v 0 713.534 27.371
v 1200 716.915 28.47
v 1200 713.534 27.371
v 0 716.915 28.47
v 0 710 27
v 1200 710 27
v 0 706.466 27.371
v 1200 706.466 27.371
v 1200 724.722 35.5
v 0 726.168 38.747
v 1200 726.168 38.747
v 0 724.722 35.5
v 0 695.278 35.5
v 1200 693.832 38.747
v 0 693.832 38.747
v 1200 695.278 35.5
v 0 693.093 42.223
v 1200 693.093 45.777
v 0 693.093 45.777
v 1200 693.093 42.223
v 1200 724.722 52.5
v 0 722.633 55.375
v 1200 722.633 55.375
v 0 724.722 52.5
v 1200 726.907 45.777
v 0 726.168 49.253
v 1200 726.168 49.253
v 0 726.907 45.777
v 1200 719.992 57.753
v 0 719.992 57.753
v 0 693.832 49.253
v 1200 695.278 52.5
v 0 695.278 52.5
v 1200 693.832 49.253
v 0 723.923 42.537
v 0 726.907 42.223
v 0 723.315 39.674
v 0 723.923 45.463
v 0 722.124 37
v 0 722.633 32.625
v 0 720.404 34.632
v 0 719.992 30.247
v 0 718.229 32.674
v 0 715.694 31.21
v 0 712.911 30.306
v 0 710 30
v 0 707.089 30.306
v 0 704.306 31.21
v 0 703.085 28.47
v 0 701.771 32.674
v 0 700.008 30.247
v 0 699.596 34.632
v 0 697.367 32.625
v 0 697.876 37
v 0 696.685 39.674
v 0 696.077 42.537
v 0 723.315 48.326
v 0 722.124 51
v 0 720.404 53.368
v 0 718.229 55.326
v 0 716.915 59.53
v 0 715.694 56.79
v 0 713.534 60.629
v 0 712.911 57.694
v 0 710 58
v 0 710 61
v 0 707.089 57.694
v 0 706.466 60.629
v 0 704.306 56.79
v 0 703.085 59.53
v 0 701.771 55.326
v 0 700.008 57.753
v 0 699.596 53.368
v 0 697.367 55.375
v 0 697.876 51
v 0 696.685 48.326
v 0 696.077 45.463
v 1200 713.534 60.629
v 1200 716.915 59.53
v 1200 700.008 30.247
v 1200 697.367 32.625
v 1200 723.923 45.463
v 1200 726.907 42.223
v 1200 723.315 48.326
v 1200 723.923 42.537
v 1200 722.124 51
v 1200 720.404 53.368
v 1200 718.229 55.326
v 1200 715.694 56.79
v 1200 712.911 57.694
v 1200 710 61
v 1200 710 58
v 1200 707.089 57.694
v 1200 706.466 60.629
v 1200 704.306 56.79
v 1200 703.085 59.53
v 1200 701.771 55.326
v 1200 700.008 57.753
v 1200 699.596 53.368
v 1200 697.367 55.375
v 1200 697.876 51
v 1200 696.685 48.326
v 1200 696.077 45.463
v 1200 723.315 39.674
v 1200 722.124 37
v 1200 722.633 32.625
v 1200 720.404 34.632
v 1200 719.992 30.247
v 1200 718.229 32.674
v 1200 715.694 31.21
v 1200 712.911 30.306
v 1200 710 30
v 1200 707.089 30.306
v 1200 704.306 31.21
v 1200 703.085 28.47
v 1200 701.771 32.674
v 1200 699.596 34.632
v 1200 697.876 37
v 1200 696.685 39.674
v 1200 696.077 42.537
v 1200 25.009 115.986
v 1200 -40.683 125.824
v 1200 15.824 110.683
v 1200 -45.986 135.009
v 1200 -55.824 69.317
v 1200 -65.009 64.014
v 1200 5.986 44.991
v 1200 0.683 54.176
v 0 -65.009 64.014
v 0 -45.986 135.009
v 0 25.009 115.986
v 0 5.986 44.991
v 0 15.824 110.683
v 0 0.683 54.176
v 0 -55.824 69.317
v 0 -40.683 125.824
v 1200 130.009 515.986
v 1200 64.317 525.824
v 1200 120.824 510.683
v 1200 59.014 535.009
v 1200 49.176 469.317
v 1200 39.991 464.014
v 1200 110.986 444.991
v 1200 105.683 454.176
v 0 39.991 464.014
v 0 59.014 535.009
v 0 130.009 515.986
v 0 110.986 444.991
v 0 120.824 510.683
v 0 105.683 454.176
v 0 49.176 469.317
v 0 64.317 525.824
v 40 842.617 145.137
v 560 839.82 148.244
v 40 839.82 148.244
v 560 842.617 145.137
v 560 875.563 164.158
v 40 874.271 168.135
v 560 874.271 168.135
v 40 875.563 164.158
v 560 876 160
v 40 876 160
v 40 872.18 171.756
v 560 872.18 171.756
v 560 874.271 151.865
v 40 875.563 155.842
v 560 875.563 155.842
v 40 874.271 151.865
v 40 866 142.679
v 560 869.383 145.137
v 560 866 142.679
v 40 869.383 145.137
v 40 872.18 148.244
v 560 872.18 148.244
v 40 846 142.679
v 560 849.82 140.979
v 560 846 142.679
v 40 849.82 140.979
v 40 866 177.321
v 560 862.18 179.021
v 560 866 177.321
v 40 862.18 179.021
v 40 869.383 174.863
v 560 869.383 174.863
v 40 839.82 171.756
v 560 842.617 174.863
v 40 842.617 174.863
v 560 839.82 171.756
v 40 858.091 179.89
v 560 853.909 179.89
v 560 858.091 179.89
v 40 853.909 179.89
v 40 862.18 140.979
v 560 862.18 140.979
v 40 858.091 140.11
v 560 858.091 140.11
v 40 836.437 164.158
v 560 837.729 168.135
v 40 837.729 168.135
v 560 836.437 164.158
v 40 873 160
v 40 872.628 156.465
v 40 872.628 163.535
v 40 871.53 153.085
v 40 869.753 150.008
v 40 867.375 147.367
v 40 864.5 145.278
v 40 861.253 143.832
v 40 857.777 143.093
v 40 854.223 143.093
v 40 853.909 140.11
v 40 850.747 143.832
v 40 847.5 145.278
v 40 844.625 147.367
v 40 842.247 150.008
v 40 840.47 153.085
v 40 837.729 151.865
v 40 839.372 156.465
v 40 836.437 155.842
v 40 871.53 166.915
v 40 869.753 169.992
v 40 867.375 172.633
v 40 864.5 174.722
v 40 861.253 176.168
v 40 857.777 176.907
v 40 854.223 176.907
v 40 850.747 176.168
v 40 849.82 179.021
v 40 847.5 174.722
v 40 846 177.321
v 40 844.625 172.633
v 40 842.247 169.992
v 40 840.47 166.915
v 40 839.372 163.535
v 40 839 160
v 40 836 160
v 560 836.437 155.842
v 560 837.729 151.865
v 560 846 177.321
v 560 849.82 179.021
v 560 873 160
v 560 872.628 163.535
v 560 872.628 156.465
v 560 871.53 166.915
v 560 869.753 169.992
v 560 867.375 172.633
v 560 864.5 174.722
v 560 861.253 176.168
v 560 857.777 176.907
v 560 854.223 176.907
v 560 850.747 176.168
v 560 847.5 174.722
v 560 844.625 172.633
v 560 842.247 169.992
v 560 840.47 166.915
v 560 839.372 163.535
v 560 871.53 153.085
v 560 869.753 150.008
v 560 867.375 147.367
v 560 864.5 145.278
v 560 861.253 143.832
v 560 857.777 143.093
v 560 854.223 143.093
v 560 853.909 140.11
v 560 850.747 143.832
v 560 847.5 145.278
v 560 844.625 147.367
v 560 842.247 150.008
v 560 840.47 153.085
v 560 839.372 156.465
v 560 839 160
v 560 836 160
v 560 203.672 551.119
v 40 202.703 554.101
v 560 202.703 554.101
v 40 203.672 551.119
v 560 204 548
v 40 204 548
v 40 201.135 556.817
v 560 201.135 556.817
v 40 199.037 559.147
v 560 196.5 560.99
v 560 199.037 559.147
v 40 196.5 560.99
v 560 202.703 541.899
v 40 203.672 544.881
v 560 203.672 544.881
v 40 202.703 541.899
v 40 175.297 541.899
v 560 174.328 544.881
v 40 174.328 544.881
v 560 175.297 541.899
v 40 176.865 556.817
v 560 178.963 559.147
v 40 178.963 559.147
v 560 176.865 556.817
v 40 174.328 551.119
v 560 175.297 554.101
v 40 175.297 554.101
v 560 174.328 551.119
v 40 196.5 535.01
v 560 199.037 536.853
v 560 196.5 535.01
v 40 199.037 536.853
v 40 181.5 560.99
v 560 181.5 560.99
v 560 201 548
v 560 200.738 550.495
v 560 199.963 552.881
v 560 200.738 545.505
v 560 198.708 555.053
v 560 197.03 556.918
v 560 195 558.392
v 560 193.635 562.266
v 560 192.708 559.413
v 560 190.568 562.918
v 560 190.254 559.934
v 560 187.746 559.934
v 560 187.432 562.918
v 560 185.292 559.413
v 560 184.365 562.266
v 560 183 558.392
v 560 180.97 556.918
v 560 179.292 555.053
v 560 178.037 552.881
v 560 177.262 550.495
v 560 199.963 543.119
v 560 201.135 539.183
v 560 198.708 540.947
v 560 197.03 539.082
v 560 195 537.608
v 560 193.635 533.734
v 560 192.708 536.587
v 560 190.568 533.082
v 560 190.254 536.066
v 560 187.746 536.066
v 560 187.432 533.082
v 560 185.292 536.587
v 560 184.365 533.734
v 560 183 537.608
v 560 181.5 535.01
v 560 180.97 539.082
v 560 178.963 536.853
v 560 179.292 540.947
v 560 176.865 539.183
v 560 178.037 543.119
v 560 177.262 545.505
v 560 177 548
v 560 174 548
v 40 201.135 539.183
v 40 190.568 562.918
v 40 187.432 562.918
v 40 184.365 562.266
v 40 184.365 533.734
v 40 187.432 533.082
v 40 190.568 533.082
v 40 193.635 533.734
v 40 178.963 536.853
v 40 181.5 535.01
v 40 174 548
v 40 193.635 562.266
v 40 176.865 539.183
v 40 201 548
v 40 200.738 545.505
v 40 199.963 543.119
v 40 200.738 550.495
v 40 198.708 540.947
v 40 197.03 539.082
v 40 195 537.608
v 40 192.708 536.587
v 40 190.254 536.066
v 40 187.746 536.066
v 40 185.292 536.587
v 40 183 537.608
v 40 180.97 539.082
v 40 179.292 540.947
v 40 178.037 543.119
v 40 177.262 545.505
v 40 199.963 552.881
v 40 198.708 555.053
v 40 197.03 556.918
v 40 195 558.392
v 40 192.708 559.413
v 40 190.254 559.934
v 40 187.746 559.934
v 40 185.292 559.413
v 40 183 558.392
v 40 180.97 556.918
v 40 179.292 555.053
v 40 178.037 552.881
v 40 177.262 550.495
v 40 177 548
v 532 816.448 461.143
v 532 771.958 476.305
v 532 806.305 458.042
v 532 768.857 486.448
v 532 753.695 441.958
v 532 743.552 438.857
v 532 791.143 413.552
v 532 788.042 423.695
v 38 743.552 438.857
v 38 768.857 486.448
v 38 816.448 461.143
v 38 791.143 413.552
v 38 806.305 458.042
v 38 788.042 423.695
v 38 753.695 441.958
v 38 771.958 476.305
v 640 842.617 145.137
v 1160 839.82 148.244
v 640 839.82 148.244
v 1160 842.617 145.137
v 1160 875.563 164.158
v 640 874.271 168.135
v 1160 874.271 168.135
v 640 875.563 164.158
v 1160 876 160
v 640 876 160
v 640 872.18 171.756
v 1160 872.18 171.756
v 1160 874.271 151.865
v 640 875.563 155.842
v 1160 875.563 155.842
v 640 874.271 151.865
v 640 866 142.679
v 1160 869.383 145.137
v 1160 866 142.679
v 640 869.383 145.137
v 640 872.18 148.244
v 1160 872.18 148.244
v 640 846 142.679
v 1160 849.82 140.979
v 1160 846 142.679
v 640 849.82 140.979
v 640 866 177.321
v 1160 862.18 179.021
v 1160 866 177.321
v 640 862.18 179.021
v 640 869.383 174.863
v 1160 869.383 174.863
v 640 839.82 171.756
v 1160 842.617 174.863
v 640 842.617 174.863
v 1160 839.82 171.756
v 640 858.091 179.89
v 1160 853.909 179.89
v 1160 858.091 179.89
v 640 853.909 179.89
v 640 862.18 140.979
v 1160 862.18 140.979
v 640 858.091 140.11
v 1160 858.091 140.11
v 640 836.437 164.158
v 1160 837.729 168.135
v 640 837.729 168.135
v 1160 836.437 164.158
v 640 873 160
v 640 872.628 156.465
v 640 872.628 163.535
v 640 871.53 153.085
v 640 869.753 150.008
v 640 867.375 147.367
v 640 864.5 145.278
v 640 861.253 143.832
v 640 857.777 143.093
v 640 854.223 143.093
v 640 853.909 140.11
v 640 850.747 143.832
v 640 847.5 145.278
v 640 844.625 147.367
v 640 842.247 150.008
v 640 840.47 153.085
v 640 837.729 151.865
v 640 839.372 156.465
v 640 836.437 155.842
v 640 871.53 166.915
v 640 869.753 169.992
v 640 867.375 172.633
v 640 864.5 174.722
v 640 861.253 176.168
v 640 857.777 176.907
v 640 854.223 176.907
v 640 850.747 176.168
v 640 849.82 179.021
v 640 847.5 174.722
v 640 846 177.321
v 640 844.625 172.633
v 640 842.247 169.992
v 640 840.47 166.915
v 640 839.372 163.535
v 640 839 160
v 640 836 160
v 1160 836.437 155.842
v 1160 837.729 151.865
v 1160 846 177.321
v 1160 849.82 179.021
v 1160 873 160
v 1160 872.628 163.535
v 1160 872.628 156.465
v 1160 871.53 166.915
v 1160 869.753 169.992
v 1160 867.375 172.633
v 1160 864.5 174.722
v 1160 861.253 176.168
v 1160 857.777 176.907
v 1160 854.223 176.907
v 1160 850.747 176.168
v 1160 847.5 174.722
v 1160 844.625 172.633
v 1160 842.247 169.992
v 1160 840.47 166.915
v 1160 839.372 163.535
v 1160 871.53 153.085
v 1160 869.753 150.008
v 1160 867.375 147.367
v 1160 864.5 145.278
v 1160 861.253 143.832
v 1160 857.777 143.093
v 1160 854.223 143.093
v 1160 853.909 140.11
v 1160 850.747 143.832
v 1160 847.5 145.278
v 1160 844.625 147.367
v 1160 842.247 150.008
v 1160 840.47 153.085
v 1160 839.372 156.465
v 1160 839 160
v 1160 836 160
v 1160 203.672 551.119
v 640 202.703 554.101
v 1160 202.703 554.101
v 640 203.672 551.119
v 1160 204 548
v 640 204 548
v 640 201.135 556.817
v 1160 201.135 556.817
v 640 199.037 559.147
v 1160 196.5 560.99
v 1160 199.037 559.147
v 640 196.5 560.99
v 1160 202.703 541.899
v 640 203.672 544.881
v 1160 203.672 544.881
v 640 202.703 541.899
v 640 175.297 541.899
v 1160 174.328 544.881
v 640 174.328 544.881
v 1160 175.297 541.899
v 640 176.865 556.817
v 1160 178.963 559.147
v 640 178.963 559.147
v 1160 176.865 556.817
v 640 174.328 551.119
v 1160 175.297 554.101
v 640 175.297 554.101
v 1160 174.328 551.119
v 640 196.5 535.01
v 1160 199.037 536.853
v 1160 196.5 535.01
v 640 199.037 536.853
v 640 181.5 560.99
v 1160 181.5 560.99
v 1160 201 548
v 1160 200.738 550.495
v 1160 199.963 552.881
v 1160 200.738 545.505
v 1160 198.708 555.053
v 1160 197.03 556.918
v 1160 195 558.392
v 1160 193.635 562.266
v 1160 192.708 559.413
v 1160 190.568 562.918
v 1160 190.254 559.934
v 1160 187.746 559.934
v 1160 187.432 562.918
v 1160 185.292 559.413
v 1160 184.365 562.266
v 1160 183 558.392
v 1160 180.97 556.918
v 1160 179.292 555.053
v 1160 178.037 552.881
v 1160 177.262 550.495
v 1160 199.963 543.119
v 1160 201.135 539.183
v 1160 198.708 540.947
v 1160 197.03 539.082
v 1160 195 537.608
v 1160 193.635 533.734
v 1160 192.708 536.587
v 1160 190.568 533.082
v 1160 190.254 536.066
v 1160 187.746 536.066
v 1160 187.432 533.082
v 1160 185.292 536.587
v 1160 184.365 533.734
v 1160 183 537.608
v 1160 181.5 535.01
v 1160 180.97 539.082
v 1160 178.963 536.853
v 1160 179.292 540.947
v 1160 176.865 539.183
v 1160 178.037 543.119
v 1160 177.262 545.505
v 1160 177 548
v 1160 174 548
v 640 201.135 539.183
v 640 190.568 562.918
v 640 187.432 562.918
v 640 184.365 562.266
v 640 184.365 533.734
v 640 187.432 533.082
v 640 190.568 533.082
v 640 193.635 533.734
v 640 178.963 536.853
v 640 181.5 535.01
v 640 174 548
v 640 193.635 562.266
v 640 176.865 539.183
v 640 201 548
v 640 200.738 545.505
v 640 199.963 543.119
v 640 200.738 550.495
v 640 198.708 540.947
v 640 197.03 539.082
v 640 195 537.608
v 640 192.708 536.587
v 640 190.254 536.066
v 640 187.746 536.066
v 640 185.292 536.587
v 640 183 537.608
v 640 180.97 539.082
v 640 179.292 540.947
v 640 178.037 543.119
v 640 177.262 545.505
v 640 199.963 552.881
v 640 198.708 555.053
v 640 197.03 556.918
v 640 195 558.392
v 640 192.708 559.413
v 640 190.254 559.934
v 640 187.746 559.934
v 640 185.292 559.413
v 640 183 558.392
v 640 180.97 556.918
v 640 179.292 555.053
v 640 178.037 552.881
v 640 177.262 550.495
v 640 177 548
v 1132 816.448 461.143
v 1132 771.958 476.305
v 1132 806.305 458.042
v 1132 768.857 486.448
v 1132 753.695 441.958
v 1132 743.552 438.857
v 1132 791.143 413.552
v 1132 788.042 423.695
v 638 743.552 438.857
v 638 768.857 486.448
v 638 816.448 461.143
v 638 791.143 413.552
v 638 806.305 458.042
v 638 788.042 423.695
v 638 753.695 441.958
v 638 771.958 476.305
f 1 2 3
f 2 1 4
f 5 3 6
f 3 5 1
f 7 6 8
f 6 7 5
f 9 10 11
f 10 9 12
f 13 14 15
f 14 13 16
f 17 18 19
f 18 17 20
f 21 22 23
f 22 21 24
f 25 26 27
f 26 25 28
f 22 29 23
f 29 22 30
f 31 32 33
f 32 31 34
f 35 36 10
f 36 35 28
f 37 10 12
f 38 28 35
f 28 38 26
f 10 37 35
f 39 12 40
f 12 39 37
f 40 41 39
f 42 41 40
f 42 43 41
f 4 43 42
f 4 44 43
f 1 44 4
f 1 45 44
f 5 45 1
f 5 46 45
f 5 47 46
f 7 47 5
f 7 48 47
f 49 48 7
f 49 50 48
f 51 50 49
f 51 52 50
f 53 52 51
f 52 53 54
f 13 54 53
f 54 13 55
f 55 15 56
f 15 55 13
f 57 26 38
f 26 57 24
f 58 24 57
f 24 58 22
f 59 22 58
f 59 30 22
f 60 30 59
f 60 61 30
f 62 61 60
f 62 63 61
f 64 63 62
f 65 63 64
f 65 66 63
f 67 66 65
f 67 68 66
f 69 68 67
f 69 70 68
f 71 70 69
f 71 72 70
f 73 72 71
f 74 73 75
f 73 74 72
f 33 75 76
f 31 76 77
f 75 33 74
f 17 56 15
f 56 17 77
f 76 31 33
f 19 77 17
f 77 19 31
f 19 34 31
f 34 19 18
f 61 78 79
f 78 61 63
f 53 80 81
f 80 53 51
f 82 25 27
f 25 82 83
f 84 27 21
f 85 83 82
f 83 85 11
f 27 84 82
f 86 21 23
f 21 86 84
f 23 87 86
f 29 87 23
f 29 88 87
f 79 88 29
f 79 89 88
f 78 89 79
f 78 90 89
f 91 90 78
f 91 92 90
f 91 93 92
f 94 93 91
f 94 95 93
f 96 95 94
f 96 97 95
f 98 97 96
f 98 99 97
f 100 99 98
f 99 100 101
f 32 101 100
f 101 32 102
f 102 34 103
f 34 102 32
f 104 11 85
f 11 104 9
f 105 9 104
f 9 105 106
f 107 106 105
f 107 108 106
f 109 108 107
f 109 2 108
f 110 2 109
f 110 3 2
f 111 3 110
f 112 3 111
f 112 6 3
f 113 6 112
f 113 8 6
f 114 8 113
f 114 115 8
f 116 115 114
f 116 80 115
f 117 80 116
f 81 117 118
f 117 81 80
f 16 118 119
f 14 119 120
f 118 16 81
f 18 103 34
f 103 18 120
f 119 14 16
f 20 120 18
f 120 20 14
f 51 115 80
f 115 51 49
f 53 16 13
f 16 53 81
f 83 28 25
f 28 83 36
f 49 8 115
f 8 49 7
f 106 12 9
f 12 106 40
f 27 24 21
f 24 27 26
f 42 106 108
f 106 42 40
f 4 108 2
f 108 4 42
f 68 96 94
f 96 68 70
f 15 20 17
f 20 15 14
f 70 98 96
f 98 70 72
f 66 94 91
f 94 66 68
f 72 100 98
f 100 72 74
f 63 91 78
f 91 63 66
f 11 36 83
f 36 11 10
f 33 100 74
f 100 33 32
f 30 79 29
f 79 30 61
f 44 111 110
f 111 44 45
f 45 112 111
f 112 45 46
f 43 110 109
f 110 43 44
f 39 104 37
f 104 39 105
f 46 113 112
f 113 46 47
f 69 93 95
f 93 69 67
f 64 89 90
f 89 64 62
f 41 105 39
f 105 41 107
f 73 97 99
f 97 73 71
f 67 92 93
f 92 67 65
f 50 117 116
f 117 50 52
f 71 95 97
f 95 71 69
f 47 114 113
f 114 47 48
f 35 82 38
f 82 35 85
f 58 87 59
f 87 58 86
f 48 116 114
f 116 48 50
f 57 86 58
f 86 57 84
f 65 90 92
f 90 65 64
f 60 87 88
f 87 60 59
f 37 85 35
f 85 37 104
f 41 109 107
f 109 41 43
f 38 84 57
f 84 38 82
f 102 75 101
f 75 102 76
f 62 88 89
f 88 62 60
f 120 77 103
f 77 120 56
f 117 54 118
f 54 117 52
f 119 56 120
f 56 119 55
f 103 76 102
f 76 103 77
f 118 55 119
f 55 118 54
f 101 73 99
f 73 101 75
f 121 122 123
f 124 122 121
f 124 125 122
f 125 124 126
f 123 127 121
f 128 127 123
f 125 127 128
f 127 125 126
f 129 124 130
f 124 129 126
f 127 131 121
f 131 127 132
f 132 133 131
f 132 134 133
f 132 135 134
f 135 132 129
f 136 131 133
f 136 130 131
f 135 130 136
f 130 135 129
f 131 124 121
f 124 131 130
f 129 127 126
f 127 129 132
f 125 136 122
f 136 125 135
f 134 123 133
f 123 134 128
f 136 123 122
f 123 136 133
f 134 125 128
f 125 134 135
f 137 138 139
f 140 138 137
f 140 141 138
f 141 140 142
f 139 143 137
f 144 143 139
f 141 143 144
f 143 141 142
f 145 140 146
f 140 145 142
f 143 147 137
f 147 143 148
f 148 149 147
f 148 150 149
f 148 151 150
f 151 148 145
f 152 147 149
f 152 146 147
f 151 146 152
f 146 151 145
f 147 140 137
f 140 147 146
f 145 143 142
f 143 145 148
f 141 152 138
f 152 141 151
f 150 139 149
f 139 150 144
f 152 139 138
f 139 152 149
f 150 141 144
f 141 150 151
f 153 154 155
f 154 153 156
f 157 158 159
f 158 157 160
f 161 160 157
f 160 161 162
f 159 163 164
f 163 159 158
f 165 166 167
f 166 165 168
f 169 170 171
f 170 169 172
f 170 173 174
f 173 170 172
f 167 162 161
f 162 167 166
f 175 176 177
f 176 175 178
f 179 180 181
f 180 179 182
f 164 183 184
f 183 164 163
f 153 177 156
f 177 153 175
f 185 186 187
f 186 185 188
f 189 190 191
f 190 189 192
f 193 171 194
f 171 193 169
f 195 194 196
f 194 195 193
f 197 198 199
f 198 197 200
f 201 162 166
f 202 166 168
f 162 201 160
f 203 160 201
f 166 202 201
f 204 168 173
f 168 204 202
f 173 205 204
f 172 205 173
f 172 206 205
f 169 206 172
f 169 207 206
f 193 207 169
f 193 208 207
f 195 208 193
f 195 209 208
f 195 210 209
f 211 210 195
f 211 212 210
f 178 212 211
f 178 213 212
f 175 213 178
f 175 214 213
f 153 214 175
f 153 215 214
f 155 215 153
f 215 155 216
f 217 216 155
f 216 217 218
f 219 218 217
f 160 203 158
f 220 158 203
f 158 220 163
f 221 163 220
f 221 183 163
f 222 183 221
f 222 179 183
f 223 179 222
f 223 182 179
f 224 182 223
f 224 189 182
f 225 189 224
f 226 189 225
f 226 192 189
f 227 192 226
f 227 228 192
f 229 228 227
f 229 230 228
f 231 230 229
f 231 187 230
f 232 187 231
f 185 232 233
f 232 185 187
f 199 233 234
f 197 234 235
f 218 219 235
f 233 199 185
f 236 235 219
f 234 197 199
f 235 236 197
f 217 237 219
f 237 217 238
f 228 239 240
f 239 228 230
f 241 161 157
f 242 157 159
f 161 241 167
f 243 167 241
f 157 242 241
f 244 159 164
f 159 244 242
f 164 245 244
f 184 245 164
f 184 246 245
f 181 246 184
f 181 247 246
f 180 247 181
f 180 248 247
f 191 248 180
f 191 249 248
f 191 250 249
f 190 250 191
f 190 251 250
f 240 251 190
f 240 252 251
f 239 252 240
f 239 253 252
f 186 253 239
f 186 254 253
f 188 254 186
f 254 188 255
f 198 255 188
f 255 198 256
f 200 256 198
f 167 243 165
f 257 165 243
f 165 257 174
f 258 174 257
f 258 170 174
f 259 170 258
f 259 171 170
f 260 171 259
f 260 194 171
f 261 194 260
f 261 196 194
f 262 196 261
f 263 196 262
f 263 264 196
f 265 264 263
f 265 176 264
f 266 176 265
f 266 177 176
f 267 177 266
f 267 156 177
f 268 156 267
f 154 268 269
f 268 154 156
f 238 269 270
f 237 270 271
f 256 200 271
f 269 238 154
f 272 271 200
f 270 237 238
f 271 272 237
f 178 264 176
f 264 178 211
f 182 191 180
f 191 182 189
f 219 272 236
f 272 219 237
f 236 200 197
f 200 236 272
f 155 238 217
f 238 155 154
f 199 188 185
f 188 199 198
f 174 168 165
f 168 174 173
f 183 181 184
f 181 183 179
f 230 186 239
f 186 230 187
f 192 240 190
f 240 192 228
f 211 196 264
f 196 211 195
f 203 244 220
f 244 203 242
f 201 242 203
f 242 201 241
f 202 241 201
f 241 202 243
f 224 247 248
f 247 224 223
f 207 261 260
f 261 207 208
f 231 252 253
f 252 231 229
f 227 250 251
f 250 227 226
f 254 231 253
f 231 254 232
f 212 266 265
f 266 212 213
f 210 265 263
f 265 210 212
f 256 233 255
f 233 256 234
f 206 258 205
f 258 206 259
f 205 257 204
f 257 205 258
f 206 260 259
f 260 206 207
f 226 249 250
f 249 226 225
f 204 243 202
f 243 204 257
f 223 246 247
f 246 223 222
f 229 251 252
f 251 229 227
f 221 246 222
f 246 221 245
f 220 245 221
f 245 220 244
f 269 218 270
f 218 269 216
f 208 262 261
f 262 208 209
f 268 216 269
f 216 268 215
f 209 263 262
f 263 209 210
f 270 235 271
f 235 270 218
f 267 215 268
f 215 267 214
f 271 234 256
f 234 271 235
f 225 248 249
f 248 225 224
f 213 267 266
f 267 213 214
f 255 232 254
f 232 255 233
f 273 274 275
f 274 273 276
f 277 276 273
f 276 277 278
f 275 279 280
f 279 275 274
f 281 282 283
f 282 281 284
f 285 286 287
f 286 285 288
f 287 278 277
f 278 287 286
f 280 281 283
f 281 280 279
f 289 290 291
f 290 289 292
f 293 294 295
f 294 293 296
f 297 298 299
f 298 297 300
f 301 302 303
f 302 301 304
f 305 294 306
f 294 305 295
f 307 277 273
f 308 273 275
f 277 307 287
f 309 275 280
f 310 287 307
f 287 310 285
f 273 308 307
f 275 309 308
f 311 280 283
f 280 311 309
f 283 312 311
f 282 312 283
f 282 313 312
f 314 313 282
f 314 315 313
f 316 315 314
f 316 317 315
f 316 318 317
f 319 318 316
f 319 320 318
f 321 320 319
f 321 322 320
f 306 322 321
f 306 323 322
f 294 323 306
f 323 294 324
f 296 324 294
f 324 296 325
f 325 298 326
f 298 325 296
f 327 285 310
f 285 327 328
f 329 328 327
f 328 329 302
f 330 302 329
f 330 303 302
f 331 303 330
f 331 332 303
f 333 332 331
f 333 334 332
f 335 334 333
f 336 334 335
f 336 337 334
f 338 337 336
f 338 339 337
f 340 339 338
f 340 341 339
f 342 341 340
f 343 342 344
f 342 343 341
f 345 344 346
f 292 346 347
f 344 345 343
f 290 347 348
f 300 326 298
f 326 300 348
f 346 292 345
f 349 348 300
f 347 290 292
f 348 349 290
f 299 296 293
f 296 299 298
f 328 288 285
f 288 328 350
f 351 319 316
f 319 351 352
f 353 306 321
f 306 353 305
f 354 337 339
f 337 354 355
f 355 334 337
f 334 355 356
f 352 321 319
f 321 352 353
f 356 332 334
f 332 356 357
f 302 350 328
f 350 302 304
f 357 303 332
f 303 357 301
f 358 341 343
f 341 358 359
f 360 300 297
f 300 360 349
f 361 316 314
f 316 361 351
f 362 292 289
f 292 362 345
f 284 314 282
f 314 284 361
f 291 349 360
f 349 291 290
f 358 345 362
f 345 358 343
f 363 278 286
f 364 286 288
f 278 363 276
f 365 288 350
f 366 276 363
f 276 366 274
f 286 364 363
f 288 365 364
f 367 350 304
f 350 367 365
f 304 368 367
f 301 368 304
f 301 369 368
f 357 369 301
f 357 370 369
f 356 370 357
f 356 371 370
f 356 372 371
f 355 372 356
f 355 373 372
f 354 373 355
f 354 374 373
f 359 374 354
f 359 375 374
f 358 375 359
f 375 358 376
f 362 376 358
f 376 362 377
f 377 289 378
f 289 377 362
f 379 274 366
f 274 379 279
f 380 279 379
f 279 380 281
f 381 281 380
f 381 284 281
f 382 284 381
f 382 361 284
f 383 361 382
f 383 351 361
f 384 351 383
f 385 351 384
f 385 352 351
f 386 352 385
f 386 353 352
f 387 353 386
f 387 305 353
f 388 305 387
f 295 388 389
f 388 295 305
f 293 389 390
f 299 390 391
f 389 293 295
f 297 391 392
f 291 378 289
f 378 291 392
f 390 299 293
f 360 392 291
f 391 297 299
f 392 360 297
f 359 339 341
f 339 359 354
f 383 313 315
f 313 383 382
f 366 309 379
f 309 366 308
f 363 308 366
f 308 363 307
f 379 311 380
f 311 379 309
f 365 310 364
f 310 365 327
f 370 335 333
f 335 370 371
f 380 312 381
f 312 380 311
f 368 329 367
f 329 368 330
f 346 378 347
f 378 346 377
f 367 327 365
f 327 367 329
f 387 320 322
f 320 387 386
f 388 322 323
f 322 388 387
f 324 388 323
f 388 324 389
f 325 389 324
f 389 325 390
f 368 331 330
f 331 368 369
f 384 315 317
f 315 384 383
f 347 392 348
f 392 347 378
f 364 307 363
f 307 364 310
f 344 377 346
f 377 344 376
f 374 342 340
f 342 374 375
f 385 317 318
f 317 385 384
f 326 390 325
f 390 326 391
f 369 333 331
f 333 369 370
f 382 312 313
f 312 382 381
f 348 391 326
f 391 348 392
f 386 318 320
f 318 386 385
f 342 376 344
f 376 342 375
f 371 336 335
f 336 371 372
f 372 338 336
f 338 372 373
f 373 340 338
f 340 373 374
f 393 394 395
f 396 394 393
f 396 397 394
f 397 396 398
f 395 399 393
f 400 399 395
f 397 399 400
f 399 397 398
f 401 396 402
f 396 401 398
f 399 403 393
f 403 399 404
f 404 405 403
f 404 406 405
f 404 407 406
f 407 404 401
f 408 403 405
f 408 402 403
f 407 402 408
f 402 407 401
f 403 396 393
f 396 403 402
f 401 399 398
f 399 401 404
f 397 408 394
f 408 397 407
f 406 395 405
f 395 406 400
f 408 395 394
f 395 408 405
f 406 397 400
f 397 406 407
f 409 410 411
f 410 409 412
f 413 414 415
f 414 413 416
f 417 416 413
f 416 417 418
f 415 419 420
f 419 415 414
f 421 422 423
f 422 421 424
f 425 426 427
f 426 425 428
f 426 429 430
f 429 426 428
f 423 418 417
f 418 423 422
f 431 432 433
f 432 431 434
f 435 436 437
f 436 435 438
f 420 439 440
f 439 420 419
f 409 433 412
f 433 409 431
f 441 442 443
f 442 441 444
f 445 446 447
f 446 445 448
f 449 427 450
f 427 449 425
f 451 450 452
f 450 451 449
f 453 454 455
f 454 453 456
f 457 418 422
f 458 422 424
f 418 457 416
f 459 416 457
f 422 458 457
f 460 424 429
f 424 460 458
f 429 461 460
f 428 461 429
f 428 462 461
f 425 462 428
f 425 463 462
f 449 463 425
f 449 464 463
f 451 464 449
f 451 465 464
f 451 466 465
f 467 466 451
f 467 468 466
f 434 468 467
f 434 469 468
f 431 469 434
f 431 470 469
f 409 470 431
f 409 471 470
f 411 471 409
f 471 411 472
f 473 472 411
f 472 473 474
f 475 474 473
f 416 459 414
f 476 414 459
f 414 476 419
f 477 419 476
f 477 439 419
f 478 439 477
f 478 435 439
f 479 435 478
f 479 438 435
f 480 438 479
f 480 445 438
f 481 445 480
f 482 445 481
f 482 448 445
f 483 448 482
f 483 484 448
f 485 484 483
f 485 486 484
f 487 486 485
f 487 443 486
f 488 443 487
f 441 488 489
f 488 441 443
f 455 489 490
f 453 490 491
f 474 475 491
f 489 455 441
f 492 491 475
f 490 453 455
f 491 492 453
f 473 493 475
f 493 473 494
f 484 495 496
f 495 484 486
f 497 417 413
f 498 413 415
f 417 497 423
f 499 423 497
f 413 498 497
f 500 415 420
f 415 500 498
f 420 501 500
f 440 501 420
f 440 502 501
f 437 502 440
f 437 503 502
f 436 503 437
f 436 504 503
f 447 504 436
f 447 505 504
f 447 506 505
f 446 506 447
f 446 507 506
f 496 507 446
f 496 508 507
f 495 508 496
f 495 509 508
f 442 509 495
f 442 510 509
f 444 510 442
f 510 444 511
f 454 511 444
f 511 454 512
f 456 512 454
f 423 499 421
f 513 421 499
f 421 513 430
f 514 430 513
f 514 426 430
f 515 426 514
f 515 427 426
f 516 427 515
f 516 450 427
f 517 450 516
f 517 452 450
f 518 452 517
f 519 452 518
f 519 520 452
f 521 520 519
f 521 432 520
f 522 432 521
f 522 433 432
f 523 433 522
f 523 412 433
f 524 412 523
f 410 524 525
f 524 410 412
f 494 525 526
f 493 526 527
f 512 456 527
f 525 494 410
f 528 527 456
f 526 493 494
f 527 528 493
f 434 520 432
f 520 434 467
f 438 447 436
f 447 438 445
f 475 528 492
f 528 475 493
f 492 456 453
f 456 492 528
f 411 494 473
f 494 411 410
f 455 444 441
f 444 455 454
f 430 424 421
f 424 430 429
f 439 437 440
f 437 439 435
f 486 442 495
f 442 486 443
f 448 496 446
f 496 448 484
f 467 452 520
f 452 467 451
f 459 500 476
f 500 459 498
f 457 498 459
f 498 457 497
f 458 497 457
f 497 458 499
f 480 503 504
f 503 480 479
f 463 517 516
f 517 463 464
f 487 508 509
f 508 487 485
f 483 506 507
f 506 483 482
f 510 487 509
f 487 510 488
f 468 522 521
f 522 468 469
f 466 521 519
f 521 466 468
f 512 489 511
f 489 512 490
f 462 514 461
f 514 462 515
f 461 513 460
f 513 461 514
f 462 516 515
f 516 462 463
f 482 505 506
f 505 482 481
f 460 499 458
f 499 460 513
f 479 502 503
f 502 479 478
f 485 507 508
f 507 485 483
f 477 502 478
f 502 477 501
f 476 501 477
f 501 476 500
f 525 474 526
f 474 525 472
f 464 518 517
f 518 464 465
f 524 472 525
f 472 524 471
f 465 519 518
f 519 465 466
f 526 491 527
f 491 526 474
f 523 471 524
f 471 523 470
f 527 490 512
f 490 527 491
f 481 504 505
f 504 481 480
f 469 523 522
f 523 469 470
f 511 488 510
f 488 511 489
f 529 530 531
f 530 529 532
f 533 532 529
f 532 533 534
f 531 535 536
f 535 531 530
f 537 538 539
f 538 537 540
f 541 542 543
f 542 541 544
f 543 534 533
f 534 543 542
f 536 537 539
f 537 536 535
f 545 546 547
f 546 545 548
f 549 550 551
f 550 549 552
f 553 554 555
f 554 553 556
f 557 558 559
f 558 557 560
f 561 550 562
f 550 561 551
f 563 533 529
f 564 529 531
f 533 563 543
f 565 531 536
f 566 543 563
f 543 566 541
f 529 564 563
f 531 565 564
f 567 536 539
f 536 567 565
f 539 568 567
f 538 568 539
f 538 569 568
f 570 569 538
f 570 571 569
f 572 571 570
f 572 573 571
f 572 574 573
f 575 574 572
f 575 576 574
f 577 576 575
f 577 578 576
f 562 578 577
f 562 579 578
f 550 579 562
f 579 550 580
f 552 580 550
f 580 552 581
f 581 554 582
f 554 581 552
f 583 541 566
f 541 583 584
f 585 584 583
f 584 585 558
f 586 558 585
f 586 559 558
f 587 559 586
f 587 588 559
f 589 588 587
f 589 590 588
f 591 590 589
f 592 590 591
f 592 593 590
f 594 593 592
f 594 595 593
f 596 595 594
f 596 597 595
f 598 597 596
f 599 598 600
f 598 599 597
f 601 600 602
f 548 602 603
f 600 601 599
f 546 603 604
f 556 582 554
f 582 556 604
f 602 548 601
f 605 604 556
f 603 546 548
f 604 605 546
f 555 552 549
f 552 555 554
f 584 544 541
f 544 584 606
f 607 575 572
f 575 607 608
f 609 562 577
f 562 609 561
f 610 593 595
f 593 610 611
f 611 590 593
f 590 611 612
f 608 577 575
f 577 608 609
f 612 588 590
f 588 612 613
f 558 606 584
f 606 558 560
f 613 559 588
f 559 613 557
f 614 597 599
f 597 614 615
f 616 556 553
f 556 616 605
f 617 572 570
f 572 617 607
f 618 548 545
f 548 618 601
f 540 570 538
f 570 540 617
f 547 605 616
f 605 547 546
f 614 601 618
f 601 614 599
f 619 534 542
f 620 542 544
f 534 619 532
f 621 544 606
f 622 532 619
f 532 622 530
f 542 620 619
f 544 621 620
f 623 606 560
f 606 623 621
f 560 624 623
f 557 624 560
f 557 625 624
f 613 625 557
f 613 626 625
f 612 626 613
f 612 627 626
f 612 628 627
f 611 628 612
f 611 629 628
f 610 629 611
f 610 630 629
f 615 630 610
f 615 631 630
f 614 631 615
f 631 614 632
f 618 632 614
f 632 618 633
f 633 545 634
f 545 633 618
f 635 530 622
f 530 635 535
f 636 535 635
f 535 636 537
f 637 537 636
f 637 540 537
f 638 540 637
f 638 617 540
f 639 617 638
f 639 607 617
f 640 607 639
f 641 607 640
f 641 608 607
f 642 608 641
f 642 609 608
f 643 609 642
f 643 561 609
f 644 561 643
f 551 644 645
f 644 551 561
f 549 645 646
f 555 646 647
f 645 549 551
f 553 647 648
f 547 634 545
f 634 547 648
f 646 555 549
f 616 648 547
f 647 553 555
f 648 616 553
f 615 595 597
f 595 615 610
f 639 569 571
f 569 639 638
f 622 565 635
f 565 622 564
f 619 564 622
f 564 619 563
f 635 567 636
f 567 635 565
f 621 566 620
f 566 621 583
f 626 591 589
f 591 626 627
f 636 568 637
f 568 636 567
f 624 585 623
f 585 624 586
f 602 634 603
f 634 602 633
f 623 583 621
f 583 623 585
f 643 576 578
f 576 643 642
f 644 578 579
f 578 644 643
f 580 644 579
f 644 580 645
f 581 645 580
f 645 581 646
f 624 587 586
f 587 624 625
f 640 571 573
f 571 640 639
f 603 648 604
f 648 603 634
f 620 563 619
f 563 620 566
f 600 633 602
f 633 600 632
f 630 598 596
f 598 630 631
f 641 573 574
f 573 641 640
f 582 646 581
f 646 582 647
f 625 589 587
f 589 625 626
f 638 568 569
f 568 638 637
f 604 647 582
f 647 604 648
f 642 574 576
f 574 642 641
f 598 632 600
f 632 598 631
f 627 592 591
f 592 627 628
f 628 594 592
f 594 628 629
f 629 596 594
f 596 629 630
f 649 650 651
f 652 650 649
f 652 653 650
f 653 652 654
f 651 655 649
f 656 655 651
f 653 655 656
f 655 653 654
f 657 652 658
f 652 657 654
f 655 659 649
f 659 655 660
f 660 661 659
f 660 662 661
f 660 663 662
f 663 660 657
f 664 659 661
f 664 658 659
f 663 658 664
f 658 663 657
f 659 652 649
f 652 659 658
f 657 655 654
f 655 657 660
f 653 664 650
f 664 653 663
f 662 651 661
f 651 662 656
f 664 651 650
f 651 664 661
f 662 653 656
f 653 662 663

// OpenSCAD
// INDEPENDENT VARIABLES
/* Tynes Subassemblies parameters*/
l=1200;// width of grapples
tynes_num=10;//ammmount of inner tynes
sh_thick=10; // Sheet thickness

/*Lid Parameters*/
l_lid=520;

// DEPENDENT VARIABLES**DON'T CHANGE**
d_b_tynes=l/tynes_num;// distance between tynes recalculation
l_ratio=(l_lid-l_lid*0.07)/450;// Recalculation of front and up plate based on original size


module tynes(){
color("red"){
translate([-sh_thick,0,0])rotate([0,90,0])linear_extrude(center=true,  height = sh_thick)import (file = "ingussets.dxf");

}

translate([-410,100,25])
rotate([0,90,-30])linear_extrude(center=true,  height = sh_thick)import (file = "gussets.dxf");

rotate([0,90,0])linear_extrude(center=true,  height = sh_thick)import (file = "outsidetine.dxf");

}

/* tynes(); */
/*Support Assembly
- [] mount cylinder base 01
- [] ssqa_module
- [] hinch 01
- [] Bussings for Cylinder 01
- [] Bushings for Cylinder 02
- [] pin 1
- [] pin 2
- [] Support plate on to of square tubing
*/

module hinch(){
rotate([0,90,0])linear_extrude(center=true,  height = sh_thick)import(file="hinch.dxf");

}

module mount_cylinder(){
		for (i=[0:4]) {
		translate([i*(sh_thick+sh_thick*0.1)-sh_thick*2, 0, 0])rotate([0,90,0])linear_extrude(center=true,  height = sh_thick)import(file="mount_cylinder.dxf");
	}

}

// Square tube
module sq_tube(length,size){
	/* difference() {
		cube([l,sq_tb*(24.5),sq_tb*(24.5)], center=true);
		cube(size=[l+l*0.2, sq_tb*(24.5)-15, sq_tb*(24.5)-15], center=true);
 	} */

	difference(length,size) {
		cube([length,size*24.5,size*24.5], center=true);
		cube([length+length*0.2, size*(24.5)-15, size*(24.5)-15], center=true);
	}
}


module in_tynes(){
	rotate([0,90,0])
	linear_extrude(center=true,  height = sh_thick)
	import(file="insidetine.dxf");
	color("red"){
	translate([-sh_thick,0,0])rotate([0,90,0])linear_extrude(center=true,  height = sh_thick)import (file = "ingussets.dxf");
	translate([sh_thick,0,0])rotate([0,90,0])linear_extrude(center=true,  height = sh_thick)import (file = "ingussets.dxf");

	translate([415,115,30])
	rotate([0,90,30])linear_extrude(center=true,  height = sh_thick)import (file = "gussets.dxf");
	mirror([1,0,0]){
	translate([405,115,30])
	rotate([0,90,30])linear_extrude(center=true,  height = sh_thick)import (file = "gussets.dxf");
	}
	}
}

/* in_tynes(); */
module tube(r,lng,th){
/* difference(){
	cylinder(r=17, h=l, center=true);
	cylinder(r=15, h=l+l*0.2, center=true);
	} */
	difference(){
		cylinder(r=r, h=lng, center=true);
		cylinder(r=r-th, h=lng+lng*0.2, center=true);
		}
}

translate([l/2,710,44])
color("white")
rotate([0,90,0])
tube(17,l,3);


module integration(){
// Square tube bottom
translate([-sh_thick*2,-20,40]){
translate([sh_thick*2+l/2,0,50])rotate([75,0,0])color("yellow")
// Squre tube top
sq_tube(l,3);

for (i=[0:1]) {
	translate([i*l/2,0,0]){
	color("green"){
	rotate([-15,0,0])translate([l/3.75+l_lid/2,-55,420])hinch();
	rotate([-15,0,0])translate([l/3.75-l_lid/2,-55,420])hinch();
	rotate([-15,0,0])translate([l/3.75,-55,420])mount_cylinder();
	}
	}
}


translate([sh_thick*2+l/2,105,450])rotate([75,0,0])color("blue")
sq_tube(l,3);
}

translate([d_b_tynes,0,0])for (i=[0:tynes_num-2])
   translate([i*d_b_tynes,0,0])
	 // Replace this by a module
     /* rotate([0,90,0])linear_extrude(center=true,  height = sh_thick)import(file="insidetine.dxf"); */
		 in_tynes();

translate([l,0,0])tynes();
mirror([1, 0, 0]) {
	translate([0,0,0])
	tynes();
	}
}

integration();


/*Lids subassembly*/
module lids_assem(){
module lids(){
/* - [] thickness space, coupling connection
*/
module lid_plate(){
translate([0,0,700])rotate([0,90,0])linear_extrude(center=true,  height = sh_thick)import (file = "lid_plate.dxf");
}
translate([l_lid/2-sh_thick*1.3,0,0])
lid_plate();
mirror(){
	translate([l_lid/2-sh_thick*1.3,0,0])
	lid_plate();
	}
}

module up_plate(){
	linear_extrude(height = sh_thick)import (file = "brace_plate_lid_upper.dxf");
}

module front_plate(){
	linear_extrude(height = 10)
	import (file = "brace_plate_lid_front.dxf");
}

module lid_jaw(){
	linear_extrude(height = 10, center=true)
	import (file = "lid_jaw.dxf", center=true);
}

module rod_mount(args) {
	translate([0,0,sh_thick])
	linear_extrude(height = sh_thick)
	import (file = "cylinder_rod_mount.dxf");
	color("red")
	linear_extrude(height = sh_thick)
	import (file = "cylinder_rod_mount_in.dxf");
	translate([0,0,-sh_thick])
	linear_extrude(height = sh_thick)
	import (file = "cylinder_rod_mount.dxf");
}



for (i=[0:1]) {
	translate([i*l/2,0,0])
color("yellow"){
/*lids subassembly
- [] busshings
- [x] cylinder mount
*/
translate([l/4,767,493])
rotate([12,0,0])
rotate([0,90,0])
rod_mount();


translate([l/4,856,160])
rotate([90,0,90])
tube(20,l_lid,3);

translate([l/4,189,548])
rotate([90,0,90])
tube(15,l_lid,3);

translate([l/4,880,-220])
rotate([0,90,90])
scale([1,l_ratio,1])
lid_jaw();

translate([l/4,181,-155])
lids();

translate([l/4,205,540])
rotate([-6, 0, 0])
rotate([0,0,90])
scale([1,l_ratio,1])
up_plate();

translate([l/4,865,210])
rotate([-77,0,0])
rotate([0,0,270])
scale([1,l_ratio,1])
front_plate();


translate([l/4-l/4*0.05,780,450])
rotate([62,0,0])
sq_tube(l_lid-l_lid*0.05,2.2);
		}
	}
}

lids_assem();
